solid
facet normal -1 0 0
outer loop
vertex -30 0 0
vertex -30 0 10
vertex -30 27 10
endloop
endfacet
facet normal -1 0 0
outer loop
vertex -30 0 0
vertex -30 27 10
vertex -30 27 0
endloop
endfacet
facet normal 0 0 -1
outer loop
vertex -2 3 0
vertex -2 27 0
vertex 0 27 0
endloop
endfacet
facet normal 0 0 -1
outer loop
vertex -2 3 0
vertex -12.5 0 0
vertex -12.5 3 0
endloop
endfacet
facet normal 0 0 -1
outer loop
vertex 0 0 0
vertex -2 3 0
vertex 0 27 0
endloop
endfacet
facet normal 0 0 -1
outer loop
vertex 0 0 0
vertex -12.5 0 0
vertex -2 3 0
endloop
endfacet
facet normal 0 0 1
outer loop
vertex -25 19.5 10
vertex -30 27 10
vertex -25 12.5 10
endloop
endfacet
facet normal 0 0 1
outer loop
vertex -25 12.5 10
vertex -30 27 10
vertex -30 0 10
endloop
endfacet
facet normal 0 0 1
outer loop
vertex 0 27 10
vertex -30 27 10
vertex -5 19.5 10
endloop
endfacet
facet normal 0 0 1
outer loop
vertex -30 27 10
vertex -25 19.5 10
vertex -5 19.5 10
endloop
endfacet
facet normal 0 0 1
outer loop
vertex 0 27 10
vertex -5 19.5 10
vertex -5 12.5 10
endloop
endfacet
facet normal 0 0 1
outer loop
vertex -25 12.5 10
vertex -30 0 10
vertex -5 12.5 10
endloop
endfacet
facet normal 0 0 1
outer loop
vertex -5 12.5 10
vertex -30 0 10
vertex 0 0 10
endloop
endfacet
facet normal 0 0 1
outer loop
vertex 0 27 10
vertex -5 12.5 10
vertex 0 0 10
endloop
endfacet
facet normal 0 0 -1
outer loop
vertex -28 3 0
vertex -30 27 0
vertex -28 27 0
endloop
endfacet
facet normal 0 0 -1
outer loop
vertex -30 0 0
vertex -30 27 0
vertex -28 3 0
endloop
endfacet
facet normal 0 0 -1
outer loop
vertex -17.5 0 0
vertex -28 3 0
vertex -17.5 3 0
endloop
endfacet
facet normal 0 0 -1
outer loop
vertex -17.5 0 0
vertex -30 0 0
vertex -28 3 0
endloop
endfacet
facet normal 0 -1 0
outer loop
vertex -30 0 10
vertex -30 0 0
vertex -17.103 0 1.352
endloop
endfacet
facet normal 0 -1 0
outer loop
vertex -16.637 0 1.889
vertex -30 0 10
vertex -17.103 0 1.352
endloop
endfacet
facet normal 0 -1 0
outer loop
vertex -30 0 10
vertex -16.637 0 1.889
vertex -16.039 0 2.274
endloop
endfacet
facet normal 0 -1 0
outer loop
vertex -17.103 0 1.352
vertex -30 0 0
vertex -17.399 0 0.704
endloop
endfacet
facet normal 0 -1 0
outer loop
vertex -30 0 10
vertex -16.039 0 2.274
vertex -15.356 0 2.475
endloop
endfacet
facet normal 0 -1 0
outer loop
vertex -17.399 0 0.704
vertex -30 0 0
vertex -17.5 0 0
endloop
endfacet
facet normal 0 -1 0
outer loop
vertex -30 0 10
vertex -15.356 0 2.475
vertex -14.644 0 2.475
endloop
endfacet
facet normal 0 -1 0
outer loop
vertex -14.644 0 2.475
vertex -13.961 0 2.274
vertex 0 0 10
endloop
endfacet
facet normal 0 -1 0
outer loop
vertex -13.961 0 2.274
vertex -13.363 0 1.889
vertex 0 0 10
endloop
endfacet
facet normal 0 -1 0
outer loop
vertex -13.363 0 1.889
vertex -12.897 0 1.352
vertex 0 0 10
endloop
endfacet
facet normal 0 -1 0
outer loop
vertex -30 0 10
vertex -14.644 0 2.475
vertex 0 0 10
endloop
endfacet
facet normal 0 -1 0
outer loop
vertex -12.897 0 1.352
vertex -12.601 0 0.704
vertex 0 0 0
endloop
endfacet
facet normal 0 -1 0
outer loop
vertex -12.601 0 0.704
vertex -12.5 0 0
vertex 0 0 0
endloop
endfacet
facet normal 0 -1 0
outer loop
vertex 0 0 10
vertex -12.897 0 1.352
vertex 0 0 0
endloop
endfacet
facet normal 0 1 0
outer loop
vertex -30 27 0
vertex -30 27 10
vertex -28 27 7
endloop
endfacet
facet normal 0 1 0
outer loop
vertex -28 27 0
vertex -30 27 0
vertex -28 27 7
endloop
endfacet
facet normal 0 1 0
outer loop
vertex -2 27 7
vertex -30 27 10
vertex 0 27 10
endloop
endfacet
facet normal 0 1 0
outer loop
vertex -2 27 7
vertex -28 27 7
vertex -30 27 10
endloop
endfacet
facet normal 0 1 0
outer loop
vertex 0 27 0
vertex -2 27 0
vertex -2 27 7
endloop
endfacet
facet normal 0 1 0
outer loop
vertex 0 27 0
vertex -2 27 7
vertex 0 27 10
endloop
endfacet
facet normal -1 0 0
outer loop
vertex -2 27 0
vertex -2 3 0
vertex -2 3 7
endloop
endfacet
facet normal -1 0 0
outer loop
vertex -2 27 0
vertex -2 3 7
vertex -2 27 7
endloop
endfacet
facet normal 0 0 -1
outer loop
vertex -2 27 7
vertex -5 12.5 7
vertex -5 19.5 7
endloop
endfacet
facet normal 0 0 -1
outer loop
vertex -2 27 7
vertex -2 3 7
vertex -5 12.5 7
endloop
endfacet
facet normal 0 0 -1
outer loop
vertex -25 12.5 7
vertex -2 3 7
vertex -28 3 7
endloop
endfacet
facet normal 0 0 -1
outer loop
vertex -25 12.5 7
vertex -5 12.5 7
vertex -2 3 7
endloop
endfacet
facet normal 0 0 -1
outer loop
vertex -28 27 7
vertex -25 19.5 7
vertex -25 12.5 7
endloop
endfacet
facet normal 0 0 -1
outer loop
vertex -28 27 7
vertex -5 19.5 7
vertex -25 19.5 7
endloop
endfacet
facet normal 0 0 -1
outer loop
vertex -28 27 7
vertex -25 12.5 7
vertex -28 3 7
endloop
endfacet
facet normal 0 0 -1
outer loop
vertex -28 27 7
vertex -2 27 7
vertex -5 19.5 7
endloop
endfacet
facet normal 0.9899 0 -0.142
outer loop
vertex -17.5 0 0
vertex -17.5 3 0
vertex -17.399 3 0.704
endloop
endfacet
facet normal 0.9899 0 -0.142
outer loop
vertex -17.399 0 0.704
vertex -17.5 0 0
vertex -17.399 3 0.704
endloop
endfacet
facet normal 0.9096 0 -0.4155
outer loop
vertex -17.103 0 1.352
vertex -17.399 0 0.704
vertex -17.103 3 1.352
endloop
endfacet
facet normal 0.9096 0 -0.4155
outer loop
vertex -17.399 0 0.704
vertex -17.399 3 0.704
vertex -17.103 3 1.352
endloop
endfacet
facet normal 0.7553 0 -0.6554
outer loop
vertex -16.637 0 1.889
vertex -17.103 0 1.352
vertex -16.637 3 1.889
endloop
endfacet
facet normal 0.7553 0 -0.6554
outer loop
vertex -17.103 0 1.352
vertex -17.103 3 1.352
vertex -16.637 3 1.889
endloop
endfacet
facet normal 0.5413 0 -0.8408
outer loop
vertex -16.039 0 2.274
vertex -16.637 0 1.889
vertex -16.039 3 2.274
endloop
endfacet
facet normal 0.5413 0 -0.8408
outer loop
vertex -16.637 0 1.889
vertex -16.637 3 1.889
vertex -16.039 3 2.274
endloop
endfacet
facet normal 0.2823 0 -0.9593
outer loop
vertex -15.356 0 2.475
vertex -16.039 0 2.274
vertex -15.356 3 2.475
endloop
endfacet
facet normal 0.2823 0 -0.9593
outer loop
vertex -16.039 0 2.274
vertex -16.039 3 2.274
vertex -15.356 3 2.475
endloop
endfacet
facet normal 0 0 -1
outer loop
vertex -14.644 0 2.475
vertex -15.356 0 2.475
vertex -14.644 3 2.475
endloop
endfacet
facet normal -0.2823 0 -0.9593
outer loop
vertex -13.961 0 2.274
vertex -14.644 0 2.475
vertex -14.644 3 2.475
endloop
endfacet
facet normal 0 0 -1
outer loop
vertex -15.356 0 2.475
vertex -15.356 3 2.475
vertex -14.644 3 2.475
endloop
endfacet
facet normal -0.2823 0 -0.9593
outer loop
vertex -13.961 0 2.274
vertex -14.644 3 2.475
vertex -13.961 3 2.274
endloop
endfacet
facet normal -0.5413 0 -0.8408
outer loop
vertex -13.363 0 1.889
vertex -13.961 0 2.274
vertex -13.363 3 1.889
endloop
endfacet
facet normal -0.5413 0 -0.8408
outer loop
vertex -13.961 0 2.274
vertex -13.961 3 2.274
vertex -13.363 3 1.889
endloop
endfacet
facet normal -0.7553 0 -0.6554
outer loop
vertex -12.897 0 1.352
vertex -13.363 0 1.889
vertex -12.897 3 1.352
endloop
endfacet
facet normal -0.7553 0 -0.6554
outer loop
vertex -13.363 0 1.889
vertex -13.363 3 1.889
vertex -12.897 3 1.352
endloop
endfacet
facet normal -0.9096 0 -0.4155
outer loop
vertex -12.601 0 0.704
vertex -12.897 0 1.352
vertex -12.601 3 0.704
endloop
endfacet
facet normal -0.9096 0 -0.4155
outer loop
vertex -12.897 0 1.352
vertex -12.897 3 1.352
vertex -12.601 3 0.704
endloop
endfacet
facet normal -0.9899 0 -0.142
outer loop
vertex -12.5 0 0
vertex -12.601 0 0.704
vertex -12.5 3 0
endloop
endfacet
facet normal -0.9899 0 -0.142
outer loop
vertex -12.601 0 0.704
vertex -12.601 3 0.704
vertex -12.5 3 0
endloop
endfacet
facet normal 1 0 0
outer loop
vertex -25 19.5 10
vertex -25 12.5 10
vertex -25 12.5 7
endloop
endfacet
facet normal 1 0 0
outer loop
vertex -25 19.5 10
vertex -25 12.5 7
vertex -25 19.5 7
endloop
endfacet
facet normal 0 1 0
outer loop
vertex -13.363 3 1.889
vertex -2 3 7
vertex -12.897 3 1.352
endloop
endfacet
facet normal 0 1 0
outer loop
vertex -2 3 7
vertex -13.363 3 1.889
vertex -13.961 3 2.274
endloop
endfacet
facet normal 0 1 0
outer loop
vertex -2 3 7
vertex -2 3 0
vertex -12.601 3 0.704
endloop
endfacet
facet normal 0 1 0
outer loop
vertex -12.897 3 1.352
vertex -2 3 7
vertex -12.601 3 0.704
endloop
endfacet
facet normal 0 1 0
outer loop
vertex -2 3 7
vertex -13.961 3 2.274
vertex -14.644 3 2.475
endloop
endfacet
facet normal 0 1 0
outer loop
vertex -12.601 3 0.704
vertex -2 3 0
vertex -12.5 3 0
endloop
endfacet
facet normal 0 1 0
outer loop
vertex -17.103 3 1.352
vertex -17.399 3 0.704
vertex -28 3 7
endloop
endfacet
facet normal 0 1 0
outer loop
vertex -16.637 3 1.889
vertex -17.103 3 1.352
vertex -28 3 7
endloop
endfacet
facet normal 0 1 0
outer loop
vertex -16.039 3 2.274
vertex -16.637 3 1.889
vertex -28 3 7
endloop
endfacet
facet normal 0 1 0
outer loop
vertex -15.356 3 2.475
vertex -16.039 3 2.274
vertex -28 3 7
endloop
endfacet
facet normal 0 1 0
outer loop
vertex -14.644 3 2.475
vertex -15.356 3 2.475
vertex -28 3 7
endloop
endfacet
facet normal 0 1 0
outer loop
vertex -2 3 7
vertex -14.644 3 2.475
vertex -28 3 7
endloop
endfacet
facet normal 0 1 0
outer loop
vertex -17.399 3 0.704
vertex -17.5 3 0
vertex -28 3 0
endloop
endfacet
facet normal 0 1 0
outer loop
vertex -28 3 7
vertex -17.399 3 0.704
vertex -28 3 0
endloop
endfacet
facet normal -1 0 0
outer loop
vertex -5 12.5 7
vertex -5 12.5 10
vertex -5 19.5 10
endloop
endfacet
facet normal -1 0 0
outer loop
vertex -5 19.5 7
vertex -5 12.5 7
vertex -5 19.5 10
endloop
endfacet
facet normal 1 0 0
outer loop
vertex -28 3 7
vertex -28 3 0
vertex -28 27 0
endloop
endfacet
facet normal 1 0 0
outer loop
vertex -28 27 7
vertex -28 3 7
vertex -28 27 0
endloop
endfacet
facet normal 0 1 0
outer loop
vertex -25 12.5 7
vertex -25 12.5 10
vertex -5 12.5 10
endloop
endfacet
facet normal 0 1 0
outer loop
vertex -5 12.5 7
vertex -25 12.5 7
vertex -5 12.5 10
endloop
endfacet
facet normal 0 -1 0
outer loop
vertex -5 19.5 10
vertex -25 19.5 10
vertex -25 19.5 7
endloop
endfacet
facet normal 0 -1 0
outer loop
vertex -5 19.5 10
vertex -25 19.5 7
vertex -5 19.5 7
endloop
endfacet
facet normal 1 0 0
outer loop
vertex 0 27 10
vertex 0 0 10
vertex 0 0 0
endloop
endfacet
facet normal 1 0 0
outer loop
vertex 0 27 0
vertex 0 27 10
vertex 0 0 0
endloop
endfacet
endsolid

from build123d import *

# Parameters (mm, degrees)
CROQUIS1_W              = 30
CROQUIS1_H              = 10
SALIENTE_EXTRUIR1_DEPTH = 30
CORTAR_EXTRUIR1_REACH   = 45.589
CROQUIS2_W              = 20
CROQUIS2_H              = 7
CROQUIS4_W              = 26
CROQUIS4_H              = 24
CORTAR_EXTRUIR3_DEPTH   = 7
CORTAR_EXTRUIR4_REACH   = 43.581
CROQUIS5_R              = 2.5
CROQUIS6_W              = 30
CROQUIS6_H              = 10
CORTAR_EXTRUIR5_DEPTH   = 3


with BuildPart() as part:
    # Croquis1 → Saliente-Extruir1 (new body)
    with BuildSketch(Plane(origin=(0, 0, 0), x_dir=(1, 0, 0), z_dir=(0, 1, 0))):
        with Locations((-15, -5)):
            Rectangle(CROQUIS1_W, CROQUIS1_H)
    extrude(amount=SALIENTE_EXTRUIR1_DEPTH)

    # Croquis2 → Cortar-Extruir1 (cut, up to next)
    with BuildSketch(Plane.XY.offset(10), mode=Mode.PRIVATE) as cortar_extruir1_sk1:
        with Locations((-15, 16)):
            Rectangle(CROQUIS2_W, CROQUIS2_H)
    cortar_extruir1_tool1 = extrude(cortar_extruir1_sk1.sketch, amount=-CORTAR_EXTRUIR1_REACH, mode=Mode.PRIVATE) & part.part
    add(cortar_extruir1_tool1.solids().sort_by_distance((-15, 16, 10))[0], mode=Mode.SUBTRACT)

    # Croquis4 → Cortar-Extruir3 (cut)
    with BuildSketch(Plane(origin=(0, 0, 0), x_dir=(-1, 0, 0), z_dir=(0, 0, -1))):
        with Locations((15, 15)):
            Rectangle(CROQUIS4_W, CROQUIS4_H)
    extrude(amount=-CORTAR_EXTRUIR3_DEPTH, mode=Mode.SUBTRACT)

    # Croquis5 → Cortar-Extruir4 (cut, up to next)
    with BuildSketch(Plane(origin=(0, 3, 0), x_dir=(1, 0, 0), z_dir=(0, 1, 0)), mode=Mode.PRIVATE) as cortar_extruir4_sk1:
        with Locations((-15, 0)):
            Circle(CROQUIS5_R)
    cortar_extruir4_tool1 = extrude(cortar_extruir4_sk1.sketch, amount=-CORTAR_EXTRUIR4_REACH, mode=Mode.PRIVATE) & part.part
    add(cortar_extruir4_tool1.solids().sort_by_distance((-15, 3, 0))[0], mode=Mode.SUBTRACT)

    # Croquis6 → Cortar-Extruir5 (cut)
    with BuildSketch(Plane(origin=(0, 30, 0), x_dir=(1, 0, 0), z_dir=(0, 1, 0))):
        with Locations((-15, -5)):
            Rectangle(CROQUIS6_W, CROQUIS6_H)
    extrude(amount=-CORTAR_EXTRUIR5_DEPTH, mode=Mode.SUBTRACT)


solid = part.part
